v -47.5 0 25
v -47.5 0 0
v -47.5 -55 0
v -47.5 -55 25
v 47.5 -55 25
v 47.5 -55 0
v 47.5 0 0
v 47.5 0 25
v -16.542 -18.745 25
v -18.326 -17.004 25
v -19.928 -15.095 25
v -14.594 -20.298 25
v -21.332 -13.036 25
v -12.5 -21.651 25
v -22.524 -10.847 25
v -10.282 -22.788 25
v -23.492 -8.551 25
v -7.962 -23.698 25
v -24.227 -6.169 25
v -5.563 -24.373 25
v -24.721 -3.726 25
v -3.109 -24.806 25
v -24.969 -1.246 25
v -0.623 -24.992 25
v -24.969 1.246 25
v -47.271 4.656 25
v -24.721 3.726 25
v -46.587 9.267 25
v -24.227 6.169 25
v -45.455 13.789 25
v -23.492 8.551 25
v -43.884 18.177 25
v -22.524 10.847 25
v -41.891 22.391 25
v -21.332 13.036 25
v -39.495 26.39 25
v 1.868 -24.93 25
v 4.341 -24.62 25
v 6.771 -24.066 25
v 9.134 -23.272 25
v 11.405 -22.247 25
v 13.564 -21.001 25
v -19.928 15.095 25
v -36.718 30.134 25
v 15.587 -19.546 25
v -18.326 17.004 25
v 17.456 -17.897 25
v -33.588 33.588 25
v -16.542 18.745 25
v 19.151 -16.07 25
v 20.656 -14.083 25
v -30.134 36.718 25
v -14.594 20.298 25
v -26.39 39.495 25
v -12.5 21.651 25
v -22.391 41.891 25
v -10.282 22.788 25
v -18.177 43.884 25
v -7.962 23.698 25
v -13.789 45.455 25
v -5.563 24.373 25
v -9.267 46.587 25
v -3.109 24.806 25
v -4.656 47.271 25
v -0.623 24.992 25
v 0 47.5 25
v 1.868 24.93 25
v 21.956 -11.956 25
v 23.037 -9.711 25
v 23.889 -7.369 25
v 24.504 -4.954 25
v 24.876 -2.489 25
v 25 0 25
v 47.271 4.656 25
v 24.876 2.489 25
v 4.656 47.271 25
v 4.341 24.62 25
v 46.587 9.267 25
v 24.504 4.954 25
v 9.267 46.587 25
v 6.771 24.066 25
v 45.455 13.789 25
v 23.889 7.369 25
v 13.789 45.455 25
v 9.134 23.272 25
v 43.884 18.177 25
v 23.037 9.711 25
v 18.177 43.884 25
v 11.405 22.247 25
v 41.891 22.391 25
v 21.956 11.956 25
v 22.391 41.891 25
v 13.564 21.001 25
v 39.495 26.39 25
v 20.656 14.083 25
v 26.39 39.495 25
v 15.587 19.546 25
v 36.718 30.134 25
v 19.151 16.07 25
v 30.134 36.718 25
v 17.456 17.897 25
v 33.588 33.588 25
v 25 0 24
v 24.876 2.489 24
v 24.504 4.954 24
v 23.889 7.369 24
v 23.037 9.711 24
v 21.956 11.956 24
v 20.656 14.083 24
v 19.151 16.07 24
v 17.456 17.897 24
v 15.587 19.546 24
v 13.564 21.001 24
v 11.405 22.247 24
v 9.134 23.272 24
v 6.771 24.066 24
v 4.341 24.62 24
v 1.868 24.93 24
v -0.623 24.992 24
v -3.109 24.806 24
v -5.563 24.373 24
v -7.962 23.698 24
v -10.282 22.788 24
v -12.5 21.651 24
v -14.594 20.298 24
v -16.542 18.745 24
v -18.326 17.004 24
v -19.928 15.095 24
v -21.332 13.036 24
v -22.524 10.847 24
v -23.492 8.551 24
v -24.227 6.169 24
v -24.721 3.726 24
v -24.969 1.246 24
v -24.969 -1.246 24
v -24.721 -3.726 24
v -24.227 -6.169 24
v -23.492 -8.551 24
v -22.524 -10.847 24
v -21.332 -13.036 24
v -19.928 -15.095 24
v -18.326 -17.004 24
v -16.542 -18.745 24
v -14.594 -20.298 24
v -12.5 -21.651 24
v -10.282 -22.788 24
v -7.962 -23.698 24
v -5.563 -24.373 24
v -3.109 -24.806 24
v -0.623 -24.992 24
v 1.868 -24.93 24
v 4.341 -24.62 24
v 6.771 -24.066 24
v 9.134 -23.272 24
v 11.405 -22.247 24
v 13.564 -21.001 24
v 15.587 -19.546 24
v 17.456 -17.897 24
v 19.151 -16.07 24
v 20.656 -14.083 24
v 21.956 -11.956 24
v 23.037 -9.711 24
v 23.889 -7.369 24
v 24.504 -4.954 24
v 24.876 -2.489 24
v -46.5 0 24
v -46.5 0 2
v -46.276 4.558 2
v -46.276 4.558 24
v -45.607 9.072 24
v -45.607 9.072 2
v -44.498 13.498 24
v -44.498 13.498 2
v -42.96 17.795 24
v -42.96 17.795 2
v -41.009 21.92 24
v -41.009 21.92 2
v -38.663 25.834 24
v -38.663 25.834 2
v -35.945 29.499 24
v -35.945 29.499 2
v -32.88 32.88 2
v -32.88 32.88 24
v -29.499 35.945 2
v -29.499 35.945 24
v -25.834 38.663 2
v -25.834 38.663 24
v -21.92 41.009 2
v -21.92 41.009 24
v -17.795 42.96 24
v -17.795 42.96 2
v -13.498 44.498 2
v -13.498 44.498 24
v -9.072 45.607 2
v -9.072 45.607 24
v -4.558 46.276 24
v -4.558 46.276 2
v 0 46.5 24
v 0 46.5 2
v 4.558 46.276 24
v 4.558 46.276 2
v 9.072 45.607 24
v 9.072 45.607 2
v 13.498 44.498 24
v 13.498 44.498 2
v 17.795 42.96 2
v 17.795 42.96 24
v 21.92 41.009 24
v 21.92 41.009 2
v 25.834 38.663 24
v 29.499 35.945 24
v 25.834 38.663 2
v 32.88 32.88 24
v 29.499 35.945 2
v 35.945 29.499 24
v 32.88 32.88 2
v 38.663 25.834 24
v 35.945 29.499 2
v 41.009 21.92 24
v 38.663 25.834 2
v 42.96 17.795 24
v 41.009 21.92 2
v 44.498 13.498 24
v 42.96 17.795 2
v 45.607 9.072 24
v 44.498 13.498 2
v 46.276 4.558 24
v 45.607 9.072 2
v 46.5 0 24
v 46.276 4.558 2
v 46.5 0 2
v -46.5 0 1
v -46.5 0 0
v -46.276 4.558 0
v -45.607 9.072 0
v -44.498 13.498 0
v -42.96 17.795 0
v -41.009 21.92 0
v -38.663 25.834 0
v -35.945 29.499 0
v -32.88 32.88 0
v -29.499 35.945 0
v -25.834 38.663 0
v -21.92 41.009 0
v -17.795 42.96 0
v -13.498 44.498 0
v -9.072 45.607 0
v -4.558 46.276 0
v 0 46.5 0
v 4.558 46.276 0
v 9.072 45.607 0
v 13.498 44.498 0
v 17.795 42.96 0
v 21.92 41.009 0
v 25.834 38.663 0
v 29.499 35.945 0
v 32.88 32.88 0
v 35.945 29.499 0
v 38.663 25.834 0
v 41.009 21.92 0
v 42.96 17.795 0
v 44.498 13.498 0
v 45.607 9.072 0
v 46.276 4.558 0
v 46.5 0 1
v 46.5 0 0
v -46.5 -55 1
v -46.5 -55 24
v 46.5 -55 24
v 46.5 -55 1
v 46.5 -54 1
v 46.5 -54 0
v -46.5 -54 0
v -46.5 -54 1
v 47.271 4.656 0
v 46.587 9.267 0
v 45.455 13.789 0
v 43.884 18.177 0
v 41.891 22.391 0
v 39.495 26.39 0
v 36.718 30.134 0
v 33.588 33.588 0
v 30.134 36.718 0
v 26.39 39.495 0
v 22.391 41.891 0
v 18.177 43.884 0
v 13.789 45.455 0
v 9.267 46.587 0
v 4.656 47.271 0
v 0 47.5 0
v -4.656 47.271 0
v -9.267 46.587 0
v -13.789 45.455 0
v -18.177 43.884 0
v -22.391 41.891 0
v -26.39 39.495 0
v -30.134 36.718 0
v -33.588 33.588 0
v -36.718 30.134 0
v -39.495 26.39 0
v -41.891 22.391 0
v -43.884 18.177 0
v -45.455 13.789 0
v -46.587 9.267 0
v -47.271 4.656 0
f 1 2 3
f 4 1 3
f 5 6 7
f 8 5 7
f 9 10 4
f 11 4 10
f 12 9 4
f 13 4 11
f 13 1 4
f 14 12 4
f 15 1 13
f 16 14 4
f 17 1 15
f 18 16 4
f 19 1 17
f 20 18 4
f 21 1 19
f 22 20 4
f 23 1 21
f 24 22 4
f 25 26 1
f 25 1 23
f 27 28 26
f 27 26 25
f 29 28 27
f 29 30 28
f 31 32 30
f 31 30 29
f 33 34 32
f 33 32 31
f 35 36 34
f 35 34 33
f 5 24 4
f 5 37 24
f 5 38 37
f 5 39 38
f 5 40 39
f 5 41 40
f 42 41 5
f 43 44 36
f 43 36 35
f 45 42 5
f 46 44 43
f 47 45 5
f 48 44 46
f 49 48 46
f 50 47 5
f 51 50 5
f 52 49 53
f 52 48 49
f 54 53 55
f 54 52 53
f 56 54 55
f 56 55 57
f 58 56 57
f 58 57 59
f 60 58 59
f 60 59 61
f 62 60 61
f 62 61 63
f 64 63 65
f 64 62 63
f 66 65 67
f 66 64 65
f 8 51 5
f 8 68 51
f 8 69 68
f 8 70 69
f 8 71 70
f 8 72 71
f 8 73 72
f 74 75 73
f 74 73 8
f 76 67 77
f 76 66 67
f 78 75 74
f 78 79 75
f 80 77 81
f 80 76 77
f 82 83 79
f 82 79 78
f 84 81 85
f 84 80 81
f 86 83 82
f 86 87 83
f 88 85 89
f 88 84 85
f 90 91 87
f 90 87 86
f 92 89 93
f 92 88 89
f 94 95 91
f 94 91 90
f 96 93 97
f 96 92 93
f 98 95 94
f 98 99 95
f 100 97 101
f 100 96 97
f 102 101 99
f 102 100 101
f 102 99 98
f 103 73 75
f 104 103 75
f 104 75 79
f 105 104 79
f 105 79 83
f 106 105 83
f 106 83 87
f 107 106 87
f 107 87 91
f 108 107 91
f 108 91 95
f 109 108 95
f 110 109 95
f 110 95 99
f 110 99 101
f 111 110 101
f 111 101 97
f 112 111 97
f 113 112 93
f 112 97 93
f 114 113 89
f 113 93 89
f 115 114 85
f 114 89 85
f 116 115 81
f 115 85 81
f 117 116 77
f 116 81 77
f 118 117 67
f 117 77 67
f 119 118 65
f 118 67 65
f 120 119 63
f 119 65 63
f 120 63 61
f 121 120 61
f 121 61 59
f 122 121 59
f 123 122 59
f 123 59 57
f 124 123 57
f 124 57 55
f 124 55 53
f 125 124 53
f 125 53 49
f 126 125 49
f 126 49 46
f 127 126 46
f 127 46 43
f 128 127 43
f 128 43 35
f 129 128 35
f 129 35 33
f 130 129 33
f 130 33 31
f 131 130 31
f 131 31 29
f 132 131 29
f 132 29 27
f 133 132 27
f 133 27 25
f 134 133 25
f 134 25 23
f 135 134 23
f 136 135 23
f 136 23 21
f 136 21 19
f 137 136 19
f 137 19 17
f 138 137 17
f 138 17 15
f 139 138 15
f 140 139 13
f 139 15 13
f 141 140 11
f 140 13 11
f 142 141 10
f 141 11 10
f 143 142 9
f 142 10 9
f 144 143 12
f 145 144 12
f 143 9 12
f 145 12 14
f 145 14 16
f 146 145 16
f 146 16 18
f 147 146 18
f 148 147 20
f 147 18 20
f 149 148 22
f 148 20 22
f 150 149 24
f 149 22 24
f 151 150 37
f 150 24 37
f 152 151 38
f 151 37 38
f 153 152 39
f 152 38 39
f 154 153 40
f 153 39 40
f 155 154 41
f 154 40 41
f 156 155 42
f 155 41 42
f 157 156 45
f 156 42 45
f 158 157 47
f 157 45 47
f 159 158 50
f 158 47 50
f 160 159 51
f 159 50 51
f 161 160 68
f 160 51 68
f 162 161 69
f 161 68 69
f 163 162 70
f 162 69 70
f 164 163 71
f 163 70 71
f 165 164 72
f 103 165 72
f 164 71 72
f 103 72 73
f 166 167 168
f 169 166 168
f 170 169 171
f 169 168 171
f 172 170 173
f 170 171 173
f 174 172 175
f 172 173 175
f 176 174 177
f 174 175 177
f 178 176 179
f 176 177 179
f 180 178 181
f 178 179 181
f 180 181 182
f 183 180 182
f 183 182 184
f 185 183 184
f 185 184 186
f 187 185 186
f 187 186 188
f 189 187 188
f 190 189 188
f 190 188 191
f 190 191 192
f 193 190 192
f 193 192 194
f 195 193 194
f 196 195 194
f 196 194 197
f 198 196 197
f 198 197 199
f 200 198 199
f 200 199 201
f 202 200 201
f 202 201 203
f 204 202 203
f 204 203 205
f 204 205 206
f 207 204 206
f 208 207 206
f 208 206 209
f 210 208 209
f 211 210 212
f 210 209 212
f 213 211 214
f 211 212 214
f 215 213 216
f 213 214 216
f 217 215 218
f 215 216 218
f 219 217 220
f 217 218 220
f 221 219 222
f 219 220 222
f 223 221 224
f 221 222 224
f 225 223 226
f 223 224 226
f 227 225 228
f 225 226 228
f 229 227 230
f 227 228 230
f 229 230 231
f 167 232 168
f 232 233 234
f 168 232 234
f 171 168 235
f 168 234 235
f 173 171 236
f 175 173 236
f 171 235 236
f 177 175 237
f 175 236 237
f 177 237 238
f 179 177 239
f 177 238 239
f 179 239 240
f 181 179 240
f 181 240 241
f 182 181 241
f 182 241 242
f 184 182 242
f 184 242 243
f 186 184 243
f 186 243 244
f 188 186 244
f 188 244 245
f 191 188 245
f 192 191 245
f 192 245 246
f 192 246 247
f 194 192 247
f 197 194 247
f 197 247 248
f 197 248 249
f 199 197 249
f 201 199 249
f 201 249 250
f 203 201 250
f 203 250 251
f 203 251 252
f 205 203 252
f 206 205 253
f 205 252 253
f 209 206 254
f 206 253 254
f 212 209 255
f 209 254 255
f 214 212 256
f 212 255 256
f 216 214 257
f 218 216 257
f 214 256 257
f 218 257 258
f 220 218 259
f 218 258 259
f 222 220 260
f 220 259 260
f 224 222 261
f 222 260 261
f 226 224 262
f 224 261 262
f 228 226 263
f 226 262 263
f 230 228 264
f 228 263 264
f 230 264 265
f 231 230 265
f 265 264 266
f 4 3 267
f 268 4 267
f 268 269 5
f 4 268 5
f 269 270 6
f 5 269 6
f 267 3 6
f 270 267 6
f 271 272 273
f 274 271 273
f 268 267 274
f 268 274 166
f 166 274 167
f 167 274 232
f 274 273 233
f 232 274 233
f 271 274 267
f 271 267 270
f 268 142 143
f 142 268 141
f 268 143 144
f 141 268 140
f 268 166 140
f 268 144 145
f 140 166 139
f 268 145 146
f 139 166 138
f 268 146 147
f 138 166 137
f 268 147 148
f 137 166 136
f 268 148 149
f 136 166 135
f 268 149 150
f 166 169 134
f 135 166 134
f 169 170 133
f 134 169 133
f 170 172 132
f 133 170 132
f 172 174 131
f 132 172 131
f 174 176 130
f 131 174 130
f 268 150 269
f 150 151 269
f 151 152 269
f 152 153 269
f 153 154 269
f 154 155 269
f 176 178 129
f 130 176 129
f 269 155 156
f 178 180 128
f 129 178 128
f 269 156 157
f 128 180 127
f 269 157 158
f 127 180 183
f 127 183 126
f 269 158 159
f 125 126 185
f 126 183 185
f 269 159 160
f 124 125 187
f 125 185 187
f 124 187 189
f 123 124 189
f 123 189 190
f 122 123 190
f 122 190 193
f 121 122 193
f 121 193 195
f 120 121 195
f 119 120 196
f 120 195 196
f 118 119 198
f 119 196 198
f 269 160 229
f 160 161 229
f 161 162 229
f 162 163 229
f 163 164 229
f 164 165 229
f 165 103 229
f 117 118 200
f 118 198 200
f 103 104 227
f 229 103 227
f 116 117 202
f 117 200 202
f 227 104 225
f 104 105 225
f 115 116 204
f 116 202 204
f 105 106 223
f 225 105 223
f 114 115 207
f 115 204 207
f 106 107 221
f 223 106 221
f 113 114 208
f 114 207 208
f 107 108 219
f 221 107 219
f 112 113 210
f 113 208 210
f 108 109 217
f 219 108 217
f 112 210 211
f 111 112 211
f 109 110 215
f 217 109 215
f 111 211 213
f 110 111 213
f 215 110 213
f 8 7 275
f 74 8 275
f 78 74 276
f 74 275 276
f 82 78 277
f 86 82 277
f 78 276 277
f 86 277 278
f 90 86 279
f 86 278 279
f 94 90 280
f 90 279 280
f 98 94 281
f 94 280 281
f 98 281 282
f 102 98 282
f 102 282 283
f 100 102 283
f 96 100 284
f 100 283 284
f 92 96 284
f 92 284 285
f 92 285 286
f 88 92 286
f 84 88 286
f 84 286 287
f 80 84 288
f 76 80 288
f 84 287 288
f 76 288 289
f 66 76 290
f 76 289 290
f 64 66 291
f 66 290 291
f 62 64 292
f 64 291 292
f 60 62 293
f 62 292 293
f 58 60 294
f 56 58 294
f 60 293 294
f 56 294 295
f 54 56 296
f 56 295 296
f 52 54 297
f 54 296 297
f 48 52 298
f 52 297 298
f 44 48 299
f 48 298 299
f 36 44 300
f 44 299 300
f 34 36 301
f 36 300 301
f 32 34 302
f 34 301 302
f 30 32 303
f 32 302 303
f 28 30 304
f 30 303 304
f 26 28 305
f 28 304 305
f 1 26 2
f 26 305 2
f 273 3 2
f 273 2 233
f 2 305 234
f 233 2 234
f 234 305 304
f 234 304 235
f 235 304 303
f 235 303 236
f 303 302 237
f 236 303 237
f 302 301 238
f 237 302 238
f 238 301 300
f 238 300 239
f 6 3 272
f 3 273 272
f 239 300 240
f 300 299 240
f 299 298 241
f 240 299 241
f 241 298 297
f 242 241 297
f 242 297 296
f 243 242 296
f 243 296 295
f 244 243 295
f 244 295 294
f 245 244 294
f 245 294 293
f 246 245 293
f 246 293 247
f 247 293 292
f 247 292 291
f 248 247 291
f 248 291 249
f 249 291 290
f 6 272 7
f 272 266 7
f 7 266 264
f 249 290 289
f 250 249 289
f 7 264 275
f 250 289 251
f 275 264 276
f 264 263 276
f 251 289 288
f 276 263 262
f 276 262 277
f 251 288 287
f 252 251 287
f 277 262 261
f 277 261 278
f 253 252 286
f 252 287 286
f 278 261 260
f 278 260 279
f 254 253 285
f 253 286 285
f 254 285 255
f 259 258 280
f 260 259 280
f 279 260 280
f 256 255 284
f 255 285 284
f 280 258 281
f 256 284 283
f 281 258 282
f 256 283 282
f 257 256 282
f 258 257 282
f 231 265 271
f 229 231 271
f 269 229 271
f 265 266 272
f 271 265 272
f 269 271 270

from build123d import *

# Parameters (mm, degrees)
F1_DEPTH = 25
F2_T     = -1
F3_R     = 25
F4_DEPTH = 25.001
F5_R     = 25
F6_DEPTH = 2


# Not quite as in the source:
# - after a boolean that leaves OpenCascade's solid faulty, fix() repairs it


with BuildPart() as f1:
    # F0 (on Top) → F1 (new body)
    with BuildSketch(Plane.XY):
        with BuildLine():
            ThreePointArc((-47.5, 0), (0, -47.5), (47.5, 0))
            ThreePointArc((47.5, 0), (0, 47.5), (-47.5, 0))
        make_face()
        with BuildLine():
            Line((47.5, -55), (47.5, 0))
            ThreePointArc((47.5, 0), (0, -47.5), (-47.5, 0))
            Line((-47.5, 0), (-47.5, -55))
            Line((-47.5, -55), (47.5, -55))
        make_face()
    extrude(amount=F1_DEPTH)

    # F2
    f2_openings = [f1.faces().sort_by_distance(p)[0] for p in [
        (0, -55, 12.5),
    ]]
    offset(amount=F2_T, openings=f2_openings)

    # F3 (on face) → F4 (cut, through all)
    with BuildSketch(Plane.XY.offset(25)):
        Circle(F3_R)
    extrude(amount=-F4_DEPTH, mode=Mode.SUBTRACT)

    # F5 (on face) → F6 (cut)
    with BuildSketch(Plane(origin=(0, 0, 0), x_dir=(1, 0, 0), z_dir=(0, 0, -1))):
        with BuildLine():
            Line((-46.5, 54), (-46.5, 0))
            ThreePointArc((-46.5, 0), (0, -46.5), (46.5, 0))
            Line((46.5, 0), (46.5, 54))
            Line((46.5, 54), (-46.5, 54))
        make_face()
        Circle(F5_R, mode=Mode.SUBTRACT)
        with BuildLine():
            Line((-46.5, 54), (-46.5, 0))
            ThreePointArc((-46.5, 0), (0, -46.5), (46.5, 0))
            Line((46.5, 0), (46.5, 54))
            Line((46.5, 54), (-46.5, 54))
        make_face()
    extrude(amount=-F6_DEPTH, mode=Mode.SUBTRACT)

    add(f1.part.fix(), mode=Mode.REPLACE)


solid = f1.part
